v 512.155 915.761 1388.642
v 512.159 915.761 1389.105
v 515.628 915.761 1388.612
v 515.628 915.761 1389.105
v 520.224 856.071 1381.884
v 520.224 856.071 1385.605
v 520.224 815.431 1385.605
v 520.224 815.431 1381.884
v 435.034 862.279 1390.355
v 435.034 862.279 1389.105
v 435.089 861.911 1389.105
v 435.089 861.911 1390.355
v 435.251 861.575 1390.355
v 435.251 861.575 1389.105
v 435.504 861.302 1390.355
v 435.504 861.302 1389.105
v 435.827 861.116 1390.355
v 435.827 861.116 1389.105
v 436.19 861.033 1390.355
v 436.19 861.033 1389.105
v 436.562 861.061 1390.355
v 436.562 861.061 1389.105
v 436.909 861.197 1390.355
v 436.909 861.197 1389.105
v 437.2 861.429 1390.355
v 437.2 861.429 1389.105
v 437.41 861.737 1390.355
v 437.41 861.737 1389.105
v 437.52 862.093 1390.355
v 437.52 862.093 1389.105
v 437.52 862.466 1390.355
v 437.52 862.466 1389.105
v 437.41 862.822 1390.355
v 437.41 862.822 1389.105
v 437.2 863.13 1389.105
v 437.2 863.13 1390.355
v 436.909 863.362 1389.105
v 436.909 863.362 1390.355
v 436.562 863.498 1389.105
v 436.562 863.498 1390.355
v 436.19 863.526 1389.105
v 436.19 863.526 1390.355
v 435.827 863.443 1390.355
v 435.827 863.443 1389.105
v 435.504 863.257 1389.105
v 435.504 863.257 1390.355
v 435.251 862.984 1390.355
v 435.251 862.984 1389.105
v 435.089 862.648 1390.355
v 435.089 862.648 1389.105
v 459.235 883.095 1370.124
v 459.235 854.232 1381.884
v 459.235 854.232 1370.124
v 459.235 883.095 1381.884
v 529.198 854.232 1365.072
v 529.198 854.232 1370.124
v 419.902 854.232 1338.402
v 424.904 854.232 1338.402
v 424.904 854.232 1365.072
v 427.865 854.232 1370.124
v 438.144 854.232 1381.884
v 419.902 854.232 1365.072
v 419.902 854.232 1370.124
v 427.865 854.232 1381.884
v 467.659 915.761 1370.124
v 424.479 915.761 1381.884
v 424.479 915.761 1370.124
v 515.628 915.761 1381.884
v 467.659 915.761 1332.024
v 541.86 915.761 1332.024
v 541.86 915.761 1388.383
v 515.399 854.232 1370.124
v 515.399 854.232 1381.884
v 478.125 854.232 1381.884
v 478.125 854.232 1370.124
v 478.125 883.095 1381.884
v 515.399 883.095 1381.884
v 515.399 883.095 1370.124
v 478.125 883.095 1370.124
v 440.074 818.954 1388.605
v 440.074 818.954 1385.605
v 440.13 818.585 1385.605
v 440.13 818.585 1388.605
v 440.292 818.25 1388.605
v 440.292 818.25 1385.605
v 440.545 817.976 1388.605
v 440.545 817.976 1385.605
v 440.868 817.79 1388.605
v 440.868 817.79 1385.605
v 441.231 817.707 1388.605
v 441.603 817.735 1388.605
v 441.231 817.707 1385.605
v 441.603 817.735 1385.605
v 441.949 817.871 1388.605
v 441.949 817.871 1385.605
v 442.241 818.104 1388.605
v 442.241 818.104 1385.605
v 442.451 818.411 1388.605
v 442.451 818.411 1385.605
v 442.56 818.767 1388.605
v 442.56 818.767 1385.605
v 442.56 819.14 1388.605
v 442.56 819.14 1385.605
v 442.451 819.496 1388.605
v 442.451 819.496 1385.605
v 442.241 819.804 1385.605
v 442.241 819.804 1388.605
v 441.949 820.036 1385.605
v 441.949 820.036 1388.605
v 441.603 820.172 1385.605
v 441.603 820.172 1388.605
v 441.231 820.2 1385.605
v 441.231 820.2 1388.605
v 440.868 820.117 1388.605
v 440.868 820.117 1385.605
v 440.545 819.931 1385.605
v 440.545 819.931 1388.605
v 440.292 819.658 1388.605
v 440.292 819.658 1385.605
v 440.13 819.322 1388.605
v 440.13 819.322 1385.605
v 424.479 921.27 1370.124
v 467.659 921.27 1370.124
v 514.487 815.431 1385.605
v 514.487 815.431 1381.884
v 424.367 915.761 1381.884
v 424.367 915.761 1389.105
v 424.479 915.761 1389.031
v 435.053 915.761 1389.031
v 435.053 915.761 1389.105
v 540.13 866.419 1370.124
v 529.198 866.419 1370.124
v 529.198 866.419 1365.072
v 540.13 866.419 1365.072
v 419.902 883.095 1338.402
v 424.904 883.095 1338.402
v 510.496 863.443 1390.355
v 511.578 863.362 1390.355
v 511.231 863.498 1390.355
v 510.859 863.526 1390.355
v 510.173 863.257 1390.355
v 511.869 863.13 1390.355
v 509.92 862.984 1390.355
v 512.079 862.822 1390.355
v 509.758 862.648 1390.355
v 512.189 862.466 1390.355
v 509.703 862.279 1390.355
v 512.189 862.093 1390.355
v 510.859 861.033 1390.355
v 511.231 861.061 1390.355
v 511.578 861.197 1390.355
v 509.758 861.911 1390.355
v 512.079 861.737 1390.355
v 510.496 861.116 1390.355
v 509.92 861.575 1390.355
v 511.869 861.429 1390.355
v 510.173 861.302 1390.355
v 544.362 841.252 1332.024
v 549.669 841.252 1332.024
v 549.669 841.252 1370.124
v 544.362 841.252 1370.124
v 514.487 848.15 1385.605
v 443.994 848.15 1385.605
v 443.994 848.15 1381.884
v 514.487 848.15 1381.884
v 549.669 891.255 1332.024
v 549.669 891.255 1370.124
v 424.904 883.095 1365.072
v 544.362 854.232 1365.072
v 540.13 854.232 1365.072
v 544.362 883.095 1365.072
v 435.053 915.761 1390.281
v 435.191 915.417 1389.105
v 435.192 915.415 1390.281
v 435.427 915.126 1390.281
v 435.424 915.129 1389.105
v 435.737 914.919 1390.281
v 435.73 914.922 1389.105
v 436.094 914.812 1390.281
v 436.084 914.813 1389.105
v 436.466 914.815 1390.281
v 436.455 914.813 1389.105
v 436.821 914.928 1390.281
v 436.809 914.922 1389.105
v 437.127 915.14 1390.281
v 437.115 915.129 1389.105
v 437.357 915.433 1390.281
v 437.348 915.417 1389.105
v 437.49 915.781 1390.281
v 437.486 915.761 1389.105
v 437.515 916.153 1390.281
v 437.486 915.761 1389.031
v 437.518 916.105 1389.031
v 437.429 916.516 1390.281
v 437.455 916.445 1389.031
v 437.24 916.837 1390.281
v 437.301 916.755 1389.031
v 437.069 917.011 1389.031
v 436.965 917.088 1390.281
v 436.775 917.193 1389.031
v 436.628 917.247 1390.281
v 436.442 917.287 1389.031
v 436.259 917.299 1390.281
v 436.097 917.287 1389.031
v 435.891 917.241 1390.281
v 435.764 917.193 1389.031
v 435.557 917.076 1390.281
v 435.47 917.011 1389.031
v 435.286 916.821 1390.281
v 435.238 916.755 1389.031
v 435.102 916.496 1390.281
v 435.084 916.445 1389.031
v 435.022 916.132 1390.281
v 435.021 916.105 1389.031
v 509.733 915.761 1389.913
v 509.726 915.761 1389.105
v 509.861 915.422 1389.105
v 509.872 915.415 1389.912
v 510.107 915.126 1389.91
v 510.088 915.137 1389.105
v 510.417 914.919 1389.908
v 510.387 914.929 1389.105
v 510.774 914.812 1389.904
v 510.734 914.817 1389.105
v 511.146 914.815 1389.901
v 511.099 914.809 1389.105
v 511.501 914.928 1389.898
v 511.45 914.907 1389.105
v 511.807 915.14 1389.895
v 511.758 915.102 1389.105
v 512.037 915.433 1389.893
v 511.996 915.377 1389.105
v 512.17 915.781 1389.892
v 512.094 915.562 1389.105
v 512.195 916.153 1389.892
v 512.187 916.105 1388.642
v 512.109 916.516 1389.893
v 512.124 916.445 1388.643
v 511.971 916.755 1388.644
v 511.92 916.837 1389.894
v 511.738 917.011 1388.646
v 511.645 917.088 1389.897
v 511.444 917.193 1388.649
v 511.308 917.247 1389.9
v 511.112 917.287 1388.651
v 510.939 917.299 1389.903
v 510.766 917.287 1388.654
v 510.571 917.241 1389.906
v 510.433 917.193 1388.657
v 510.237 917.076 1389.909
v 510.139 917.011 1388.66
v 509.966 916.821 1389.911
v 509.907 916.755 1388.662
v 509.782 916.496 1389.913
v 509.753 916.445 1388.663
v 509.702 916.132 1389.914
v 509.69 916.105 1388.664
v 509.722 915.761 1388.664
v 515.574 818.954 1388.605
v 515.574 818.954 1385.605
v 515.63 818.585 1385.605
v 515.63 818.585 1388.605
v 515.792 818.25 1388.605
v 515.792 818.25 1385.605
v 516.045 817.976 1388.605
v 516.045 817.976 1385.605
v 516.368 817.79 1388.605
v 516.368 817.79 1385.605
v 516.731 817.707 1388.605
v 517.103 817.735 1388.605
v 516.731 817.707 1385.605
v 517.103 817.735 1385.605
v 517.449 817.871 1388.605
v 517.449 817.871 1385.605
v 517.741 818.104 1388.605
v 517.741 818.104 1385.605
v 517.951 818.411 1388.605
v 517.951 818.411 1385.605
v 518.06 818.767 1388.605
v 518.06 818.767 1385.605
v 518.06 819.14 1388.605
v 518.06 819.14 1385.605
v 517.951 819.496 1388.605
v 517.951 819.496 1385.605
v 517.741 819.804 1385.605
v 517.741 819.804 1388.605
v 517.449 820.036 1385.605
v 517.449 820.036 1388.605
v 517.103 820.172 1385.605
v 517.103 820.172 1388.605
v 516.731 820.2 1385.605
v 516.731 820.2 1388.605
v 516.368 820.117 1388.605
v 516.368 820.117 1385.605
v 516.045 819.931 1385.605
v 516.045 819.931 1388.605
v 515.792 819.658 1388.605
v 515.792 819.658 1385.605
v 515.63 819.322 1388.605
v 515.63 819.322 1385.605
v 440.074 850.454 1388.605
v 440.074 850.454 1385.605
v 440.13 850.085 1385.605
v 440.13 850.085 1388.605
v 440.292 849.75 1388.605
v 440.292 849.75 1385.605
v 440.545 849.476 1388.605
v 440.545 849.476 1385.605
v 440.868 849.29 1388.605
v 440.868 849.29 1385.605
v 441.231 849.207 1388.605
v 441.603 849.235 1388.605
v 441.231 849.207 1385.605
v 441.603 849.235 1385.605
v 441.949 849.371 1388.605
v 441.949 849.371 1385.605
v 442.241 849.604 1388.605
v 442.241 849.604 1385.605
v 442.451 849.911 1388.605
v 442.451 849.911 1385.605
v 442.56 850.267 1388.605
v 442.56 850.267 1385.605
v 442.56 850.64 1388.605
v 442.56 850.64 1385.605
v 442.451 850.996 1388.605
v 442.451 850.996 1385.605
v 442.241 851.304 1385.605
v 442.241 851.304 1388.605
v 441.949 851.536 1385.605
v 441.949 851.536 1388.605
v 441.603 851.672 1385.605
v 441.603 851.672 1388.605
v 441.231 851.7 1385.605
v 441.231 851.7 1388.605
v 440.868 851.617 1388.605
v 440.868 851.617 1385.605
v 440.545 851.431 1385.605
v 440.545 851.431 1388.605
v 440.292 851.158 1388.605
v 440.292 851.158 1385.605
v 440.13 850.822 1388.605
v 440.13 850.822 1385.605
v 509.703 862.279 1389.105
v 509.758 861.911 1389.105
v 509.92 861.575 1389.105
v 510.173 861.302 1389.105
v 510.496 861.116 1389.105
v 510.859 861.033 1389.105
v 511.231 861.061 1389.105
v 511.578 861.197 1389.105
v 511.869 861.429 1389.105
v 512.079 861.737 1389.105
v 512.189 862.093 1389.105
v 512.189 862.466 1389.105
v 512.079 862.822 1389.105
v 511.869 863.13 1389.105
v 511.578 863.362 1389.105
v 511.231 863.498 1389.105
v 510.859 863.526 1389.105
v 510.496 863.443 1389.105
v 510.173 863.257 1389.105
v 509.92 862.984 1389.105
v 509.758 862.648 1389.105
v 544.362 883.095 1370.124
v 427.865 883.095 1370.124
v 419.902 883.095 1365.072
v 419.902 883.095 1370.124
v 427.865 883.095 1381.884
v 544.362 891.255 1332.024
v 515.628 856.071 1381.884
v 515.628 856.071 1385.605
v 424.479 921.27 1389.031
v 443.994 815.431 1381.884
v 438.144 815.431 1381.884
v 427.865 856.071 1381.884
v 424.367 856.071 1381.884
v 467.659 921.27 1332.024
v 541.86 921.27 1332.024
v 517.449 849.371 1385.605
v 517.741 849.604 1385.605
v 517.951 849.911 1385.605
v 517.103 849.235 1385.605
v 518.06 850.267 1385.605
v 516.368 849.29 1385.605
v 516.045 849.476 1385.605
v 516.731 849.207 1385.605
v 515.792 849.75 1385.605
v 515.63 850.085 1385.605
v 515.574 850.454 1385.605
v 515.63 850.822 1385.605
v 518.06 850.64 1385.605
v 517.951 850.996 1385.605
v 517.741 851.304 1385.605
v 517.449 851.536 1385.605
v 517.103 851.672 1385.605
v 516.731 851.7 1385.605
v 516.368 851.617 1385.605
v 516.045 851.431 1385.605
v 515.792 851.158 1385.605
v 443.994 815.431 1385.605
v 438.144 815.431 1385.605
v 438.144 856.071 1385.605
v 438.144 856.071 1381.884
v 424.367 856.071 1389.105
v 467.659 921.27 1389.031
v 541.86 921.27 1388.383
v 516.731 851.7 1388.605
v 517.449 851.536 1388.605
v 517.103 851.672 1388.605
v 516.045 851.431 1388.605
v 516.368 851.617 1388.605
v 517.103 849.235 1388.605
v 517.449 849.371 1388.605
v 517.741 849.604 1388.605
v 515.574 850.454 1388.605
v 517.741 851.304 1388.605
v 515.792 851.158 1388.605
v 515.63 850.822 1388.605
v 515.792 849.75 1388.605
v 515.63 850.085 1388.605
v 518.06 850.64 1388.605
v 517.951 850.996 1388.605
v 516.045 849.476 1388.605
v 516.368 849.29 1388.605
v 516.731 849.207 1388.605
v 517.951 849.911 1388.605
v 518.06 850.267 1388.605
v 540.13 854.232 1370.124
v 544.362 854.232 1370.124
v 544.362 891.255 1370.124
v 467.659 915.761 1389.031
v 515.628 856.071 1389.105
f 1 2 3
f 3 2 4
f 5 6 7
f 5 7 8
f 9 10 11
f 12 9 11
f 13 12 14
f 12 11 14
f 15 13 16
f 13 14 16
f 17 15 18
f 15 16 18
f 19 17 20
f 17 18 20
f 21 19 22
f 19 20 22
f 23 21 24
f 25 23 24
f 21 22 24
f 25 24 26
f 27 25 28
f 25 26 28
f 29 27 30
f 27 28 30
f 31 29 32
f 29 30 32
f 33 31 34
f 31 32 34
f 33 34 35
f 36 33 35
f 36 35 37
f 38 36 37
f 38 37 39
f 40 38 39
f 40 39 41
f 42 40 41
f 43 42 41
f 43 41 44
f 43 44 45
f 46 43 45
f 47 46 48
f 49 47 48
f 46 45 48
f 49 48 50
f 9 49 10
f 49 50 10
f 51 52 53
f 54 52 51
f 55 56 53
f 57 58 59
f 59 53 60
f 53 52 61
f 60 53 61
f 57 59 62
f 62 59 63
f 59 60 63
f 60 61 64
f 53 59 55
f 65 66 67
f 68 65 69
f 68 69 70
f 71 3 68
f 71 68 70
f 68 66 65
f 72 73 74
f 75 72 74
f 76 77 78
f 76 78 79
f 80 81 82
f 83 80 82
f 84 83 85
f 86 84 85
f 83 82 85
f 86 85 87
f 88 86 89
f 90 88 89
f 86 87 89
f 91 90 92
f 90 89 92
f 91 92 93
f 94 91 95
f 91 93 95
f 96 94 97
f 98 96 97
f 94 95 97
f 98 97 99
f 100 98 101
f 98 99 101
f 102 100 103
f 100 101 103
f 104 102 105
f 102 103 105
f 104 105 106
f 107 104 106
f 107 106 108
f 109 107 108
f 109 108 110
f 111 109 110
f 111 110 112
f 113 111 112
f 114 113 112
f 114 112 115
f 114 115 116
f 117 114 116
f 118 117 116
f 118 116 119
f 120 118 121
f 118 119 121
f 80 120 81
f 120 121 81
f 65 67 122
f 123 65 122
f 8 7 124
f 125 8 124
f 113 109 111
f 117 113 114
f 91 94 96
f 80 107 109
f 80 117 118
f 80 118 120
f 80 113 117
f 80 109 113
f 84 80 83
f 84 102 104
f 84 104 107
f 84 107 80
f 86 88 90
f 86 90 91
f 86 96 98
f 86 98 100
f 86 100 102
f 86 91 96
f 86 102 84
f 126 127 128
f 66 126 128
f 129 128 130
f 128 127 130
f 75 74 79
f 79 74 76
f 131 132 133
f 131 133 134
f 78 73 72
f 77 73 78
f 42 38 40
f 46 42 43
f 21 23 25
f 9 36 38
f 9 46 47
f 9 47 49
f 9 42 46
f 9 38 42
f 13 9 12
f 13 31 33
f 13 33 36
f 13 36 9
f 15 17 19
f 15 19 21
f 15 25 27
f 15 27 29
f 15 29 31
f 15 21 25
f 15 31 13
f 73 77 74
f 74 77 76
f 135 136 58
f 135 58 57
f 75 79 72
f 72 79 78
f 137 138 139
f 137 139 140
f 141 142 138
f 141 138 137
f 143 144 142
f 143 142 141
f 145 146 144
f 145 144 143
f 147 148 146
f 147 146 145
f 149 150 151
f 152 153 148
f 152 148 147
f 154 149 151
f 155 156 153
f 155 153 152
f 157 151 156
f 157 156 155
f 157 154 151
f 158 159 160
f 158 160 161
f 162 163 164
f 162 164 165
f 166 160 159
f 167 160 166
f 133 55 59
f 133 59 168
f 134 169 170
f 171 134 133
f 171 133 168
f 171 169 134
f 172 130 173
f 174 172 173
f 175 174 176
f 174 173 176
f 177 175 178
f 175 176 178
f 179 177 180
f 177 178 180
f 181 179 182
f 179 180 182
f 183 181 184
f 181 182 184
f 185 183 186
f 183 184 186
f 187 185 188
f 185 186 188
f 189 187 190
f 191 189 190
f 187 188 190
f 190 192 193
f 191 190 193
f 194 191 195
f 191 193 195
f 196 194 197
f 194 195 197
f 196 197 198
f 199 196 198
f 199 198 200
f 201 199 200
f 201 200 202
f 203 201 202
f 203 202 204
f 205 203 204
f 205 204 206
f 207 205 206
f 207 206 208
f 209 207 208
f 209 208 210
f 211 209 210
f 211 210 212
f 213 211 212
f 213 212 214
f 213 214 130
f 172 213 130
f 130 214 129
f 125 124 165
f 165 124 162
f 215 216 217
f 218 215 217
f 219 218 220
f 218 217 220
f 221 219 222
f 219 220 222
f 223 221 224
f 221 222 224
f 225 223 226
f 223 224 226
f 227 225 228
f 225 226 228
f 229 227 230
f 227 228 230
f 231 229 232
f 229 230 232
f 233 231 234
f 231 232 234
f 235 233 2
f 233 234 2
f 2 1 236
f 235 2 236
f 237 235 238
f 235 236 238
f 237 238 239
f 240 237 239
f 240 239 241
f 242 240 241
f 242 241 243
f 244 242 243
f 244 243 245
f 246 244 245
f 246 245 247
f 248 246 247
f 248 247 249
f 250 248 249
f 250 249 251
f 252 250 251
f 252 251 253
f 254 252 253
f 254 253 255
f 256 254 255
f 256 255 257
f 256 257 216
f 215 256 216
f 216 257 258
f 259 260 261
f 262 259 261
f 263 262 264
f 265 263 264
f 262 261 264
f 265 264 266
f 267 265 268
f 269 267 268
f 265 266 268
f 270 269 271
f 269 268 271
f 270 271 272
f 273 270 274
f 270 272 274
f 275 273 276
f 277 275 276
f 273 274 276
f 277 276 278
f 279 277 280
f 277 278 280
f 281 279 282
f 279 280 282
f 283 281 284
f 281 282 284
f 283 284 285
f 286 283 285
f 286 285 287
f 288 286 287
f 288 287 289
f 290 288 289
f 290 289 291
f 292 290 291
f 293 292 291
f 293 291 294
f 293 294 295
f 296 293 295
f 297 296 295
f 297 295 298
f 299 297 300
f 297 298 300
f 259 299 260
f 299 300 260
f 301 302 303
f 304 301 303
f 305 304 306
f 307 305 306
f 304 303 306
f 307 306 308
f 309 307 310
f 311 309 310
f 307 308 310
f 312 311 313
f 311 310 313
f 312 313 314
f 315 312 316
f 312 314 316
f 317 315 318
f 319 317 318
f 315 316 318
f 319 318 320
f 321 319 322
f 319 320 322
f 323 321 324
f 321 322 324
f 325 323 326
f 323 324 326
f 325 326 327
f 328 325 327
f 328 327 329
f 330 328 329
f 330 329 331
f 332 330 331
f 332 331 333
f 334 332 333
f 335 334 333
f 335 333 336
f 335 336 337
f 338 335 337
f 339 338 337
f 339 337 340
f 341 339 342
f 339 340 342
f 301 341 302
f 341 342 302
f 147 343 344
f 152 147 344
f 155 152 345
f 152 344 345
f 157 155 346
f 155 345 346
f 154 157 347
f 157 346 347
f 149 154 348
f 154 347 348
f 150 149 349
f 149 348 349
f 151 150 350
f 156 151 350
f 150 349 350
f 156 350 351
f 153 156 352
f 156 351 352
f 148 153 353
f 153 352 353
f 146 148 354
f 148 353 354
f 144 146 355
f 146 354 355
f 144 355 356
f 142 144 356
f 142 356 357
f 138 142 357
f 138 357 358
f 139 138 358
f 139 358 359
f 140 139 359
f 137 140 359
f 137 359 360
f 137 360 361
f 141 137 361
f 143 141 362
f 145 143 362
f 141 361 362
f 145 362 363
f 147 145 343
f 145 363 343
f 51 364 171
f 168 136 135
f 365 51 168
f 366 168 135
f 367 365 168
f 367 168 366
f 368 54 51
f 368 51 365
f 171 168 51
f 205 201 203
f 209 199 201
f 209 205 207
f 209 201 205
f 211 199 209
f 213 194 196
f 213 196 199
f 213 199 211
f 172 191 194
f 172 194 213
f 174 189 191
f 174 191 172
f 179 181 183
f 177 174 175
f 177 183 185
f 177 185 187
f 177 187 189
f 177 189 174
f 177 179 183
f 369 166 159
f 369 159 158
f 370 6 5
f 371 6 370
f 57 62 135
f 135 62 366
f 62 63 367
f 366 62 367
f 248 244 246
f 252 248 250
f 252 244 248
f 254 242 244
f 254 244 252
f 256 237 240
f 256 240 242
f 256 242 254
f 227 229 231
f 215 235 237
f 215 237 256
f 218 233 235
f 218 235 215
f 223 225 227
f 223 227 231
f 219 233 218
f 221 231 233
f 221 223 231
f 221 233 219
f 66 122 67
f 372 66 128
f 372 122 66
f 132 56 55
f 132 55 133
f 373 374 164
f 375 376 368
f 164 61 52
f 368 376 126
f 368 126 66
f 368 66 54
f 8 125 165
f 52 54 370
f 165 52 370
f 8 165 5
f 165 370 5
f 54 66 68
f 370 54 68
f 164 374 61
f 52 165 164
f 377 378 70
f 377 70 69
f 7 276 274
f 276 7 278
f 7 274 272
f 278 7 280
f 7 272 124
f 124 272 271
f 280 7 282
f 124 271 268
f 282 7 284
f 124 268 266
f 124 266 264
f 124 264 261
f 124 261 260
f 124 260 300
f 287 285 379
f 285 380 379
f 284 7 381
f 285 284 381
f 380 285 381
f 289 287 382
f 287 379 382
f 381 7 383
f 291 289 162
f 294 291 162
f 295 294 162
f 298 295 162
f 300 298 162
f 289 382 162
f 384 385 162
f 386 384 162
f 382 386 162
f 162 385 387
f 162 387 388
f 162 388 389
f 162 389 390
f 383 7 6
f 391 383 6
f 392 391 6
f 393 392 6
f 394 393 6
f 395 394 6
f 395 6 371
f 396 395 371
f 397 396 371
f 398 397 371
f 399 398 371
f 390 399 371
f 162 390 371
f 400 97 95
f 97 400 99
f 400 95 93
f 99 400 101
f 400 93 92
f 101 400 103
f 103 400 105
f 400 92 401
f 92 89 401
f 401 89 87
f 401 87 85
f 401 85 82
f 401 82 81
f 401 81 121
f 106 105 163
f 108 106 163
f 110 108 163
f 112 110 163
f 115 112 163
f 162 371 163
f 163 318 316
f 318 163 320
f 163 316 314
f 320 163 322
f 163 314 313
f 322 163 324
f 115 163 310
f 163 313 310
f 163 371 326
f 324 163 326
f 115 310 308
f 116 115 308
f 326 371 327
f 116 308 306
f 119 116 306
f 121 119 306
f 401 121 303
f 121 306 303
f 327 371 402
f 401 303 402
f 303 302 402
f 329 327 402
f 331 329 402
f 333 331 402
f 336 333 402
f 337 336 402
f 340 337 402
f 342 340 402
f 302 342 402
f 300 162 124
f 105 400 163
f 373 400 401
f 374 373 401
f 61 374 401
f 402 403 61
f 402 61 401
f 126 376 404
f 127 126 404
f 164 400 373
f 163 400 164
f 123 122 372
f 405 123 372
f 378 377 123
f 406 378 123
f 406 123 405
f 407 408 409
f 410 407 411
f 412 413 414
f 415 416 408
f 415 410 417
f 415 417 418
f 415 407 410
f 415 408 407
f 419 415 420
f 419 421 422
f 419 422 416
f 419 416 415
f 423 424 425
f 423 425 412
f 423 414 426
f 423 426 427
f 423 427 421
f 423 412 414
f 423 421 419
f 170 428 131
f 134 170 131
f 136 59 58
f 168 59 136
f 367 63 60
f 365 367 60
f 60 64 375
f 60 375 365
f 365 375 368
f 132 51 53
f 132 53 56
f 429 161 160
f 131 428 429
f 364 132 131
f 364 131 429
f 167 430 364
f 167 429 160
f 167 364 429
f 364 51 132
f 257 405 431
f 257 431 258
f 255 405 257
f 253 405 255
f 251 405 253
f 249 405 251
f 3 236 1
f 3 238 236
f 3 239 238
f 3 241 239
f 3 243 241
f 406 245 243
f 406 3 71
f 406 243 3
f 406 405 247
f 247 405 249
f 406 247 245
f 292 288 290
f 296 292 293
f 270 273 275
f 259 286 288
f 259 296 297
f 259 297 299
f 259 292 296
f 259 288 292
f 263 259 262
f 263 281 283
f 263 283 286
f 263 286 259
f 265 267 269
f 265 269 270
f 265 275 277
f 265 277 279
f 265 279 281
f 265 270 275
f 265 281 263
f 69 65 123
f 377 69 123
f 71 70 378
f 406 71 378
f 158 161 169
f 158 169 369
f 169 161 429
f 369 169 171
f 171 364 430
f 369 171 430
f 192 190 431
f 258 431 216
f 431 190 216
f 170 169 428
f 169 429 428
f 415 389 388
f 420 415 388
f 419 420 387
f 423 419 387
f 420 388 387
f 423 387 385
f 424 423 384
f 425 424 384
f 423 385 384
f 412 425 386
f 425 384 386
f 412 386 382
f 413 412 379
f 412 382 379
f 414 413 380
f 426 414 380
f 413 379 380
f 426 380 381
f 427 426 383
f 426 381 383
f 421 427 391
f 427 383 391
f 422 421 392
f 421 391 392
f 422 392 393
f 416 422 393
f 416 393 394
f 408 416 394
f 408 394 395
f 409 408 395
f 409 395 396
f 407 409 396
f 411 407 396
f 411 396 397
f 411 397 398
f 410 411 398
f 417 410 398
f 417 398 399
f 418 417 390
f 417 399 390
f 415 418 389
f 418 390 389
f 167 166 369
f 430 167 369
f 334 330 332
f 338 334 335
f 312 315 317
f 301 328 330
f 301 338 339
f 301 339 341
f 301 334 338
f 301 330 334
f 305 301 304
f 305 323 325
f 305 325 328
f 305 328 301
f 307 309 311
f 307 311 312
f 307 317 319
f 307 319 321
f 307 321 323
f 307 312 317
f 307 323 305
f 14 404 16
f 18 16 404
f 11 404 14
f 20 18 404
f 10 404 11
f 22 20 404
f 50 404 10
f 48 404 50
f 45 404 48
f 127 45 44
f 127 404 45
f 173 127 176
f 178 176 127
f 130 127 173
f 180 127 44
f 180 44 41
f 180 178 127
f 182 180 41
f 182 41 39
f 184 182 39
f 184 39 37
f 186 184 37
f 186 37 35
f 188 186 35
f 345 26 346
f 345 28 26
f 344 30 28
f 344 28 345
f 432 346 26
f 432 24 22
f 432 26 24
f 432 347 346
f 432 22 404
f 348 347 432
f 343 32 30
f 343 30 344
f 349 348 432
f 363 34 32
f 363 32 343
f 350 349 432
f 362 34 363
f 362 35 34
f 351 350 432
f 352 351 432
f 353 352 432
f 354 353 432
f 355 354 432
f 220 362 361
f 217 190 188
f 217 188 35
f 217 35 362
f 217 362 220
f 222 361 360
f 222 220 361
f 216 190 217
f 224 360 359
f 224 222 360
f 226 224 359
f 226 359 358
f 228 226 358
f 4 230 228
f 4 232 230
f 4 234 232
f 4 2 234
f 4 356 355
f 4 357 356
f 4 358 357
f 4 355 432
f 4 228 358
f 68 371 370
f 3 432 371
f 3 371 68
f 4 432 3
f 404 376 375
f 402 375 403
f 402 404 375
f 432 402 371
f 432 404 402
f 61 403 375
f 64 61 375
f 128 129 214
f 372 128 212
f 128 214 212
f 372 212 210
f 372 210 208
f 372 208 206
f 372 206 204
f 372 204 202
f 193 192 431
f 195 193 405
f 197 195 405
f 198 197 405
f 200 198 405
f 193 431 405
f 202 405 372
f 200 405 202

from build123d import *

# Parameters (mm, degrees)
SKETCH2_W             = 74.20112143
SKETCH2_H             = 5.509329328
BOSS_EXTRUDE1_DEPTH   = 31.75
SKETCH2_W_2           = 5.306940646
SKETCH2_H_2           = 50.003346063
BOSS_EXTRUDE1_2_DEPTH = 31.75
SKETCH3_W             = 74.20112143
SKETCH3_H             = 5.509329328
SKETCH3_W_2           = 5.306940646
SKETCH3_H_2           = 50.003346063
BOSS_EXTRUDE2_DEPTH   = 6.35
SKETCH4_W             = 5.051549335
SKETCH4_H             = 28.862745674
BOSS_EXTRUDE3_DEPTH   = 124.46
SKETCH5_W             = 5.001212889
SKETCH5_H             = 28.862745674
BOSS_EXTRUDE4_DEPTH   = 26.67
BOSS_EXTRUDE7_REACH   = 1075.465
SKETCH9_W             = 74.20112143
SKETCH9_H             = 5.509329328
SKETCH11_W            = 119.769071802
SKETCH11_H            = 7.221051578
BOSS_EXTRUDE8_DEPTH   = 59.69
SKETCH12_W            = 18.906782183
SKETCH12_H            = 5.509329328
BOSS_EXTRUDE9_DEPTH   = 43.18
SKETCH13_R            = 1.25
BOSS_EXTRUDE10_DEPTH  = 1.25
SKETCH14_R            = 1.25
BOSS_EXTRUDE11_DEPTH  = 1.25
SKETCH15_R            = 1.25
BOSS_EXTRUDE12_DEPTH  = 1.25
SKETCH17_W            = 28.508394359
SKETCH17_H            = 59.69
CUT_EXTRUDE1_DEPTH    = 7.62
SKETCH18_W            = 10.932918465
SKETCH18_H            = 12.187050208
CUT_EXTRUDE2_DEPTH    = 7.62
BOSS_EXTRUDE13_DEPTH  = 40.64
SKETCH21_W            = 70.492813389
SKETCH21_H            = 32.719224038
CUT_EXTRUDE3_DEPTH    = 12.7
SKETCH22_R            = 1.25
BOSS_EXTRUDE14_DEPTH  = 3
BOSS_EXTRUDE15_REACH  = 1075.947
SKETCH24_W            = 37.273805704
SKETCH24_H            = 28.862745674
BOSS_EXTRUDE16_REACH  = 1075.947
SKETCH25_W            = 31.370714304
SKETCH25_H            = 28.862745674


with BuildPart() as part:
    # Sketch2 → Boss-Extrude1 (new body)
    with BuildSketch(Plane.XY.offset(1338.373843603)):
        with Locations((504.759181332, 918.515687133)):
            Rectangle(SKETCH2_W, SKETCH2_H)
    extrude(amount=BOSS_EXTRUDE1_DEPTH)



with BuildPart() as body_2:
    # Sketch2 → Boss-Extrude1 2 (new body)
    with BuildSketch(Plane.XY.offset(1338.373843603)):
        with Locations((547.015879906, 866.253246095)):
            Rectangle(SKETCH2_W_2, SKETCH2_H_2)
    extrude(amount=BOSS_EXTRUDE1_2_DEPTH)


with BuildPart() as part_1:
    add(part.part)

    add(body_2.part)  # Boss-Extrude2 merges body 2
    # Sketch3 → Boss-Extrude2 (add)
    with BuildSketch(Plane(origin=(0, 0, 1338.373843603), x_dir=(-1, 0, 0), z_dir=(0, 0, -1))):
        with Locations((-504.759181332, 918.515687133)):
            Rectangle(SKETCH3_W, SKETCH3_H)
        with Locations((-547.015879906, 866.253246095)):
            Rectangle(SKETCH3_W_2, SKETCH3_H_2)
    extrude(amount=BOSS_EXTRUDE2_DEPTH)

    # Sketch4 → Boss-Extrude3 (add)
    with BuildSketch(Plane.ZY.offset(-544.362409583)):
        with Locations((1367.598068936, 868.663439861)):
            Rectangle(SKETCH4_W, SKETCH4_H)
    extrude(amount=BOSS_EXTRUDE3_DEPTH)

    # Sketch5 → Boss-Extrude4 (add)
    with BuildSketch(Plane(origin=(0, 0, 1365.072294268), x_dir=(-1, 0, 0), z_dir=(0, 0, -1))):
        with Locations((-422.403016028, 868.663439861)):
            Rectangle(SKETCH5_W, SKETCH5_H)
    extrude(amount=BOSS_EXTRUDE4_DEPTH)



with BuildPart() as body_2_2:
    # Boss-Extrude7: up to this plane
    boss_extrude7_end = Plane(origin=(483.853693238, 889.164381922, 1388.889293529), z_dir=(0.008726535498373836, 0, 0.9999619230641713))
    # Sketch9 → Boss-Extrude7 (new, up to the surface)
    with BuildSketch(Plane.XY.offset(1370.123843603), mode=Mode.PRIVATE) as boss_extrude7_sk1:
        with Locations((504.759181332, 918.515687133)):
            Rectangle(SKETCH9_W, SKETCH9_H)
    boss_extrude7_tool1 = split(extrude(boss_extrude7_sk1.sketch, amount=BOSS_EXTRUDE7_REACH, mode=Mode.PRIVATE), bisect_by=boss_extrude7_end, keep=Keep.BOTH, mode=Mode.PRIVATE)
    add(boss_extrude7_tool1.solids().sort_by_distance((504.759181, 918.515687, 1370.123844))[0])

    # Sketch11 → Boss-Extrude8 (add)
    with BuildSketch(Plane.XZ.offset(-915.761022469)):
        with Locations((484.251561922, 1385.494960895)):
            Rectangle(SKETCH11_W, SKETCH11_H)
    extrude(amount=BOSS_EXTRUDE8_DEPTH)


with BuildPart() as part_2:
    add(part_1.part)

    add(body_2_2.part)  # Boss-Extrude9 merges body 2 2
    # Sketch12 → Boss-Extrude9 (add)
    with BuildSketch(Plane.ZY.offset(-467.658620617)):
        with Locations((1379.577234695, 918.515687133)):
            Rectangle(SKETCH12_W, SKETCH12_H)
    extrude(amount=BOSS_EXTRUDE9_DEPTH)

    # Sketch13 → Boss-Extrude10 (add)
    with BuildSketch(Plane.XY.offset(1389.105486684)):
        with Locations(Location((436.283580196, 862.279381922, 0), (0, 0, 180))):
            Circle(SKETCH13_R)
        with Locations(Location((510.952736915, 862.279381922, 0), (0, 0, 180))):
            Circle(SKETCH13_R)
    extrude(amount=BOSS_EXTRUDE10_DEPTH)

    # Sketch14 → Boss-Extrude11 (add)
    with BuildSketch(Plane.XY.offset(1389.030625786)):
        with Locations(Location((436.269505167, 916.049381922, 0), (0, 0, 193.337554782))):
            Circle(SKETCH14_R)
    extrude(amount=BOSS_EXTRUDE11_DEPTH)

    # Sketch15 → Boss-Extrude12 (add)
    with BuildSketch(Plane(origin=(12.156576854, 0, 1393.005731901), x_dir=(0.9999619230641713, 0, -0.008726535498373836), z_dir=(0.008726535498373836, 0, 0.9999619230641713))):
        with Locations(Location((498.801077848, 916.049381922, 0), (0, 0, 193.337554782))):
            Circle(SKETCH15_R)
    extrude(amount=BOSS_EXTRUDE12_DEPTH)

    # Sketch17 → Cut-Extrude1 (cut)
    with BuildSketch(Plane.XY.offset(1389.105486684)):
        with Locations((529.881900643, 885.916022469)):
            Rectangle(SKETCH17_W, SKETCH17_H)
    extrude(amount=-CUT_EXTRUDE1_DEPTH, mode=Mode.SUBTRACT)

    # Sketch18 → Cut-Extrude2 (cut)
    with BuildSketch(Plane.XY.offset(1370.123843603)):
        with Locations((534.664039293, 860.325592128)):
            Rectangle(SKETCH18_W, SKETCH18_H)
    extrude(amount=-CUT_EXTRUDE2_DEPTH, mode=Mode.SUBTRACT)

    # Sketch20 → Boss-Extrude13 (add)
    with BuildSketch(Plane.XZ.offset(-856.071022469)):
        Polygon((515.627703464, 1385.604979593), (520.22442703, 1385.604979593), (520.22442703, 1381.884435106), (515.627703464, 1381.884435106), (438.143953154, 1381.884435106), (438.143953154, 1385.604979593), align=None)
    extrude(amount=BOSS_EXTRUDE13_DEPTH)

    # Sketch21 → Cut-Extrude3 (cut)
    with BuildSketch(Plane.XY.offset(1385.604979593)):
        with Locations((479.240417437, 831.790634488)):
            Rectangle(SKETCH21_W, SKETCH21_H)
    extrude(amount=-CUT_EXTRUDE3_DEPTH, mode=Mode.SUBTRACT)

    # Sketch22 → Boss-Extrude14 (add)
    with BuildSketch(Plane.XY.offset(1385.604979593)):
        with Locations(Location((516.824440929, 850.453733138, 0), (0, 0, 180))):
            Circle(SKETCH22_R)
        with Locations(Location((516.824440929, 818.953733138, 0), (0, 0, 180))):
            Circle(SKETCH22_R)
        with Locations(Location((441.324440929, 850.453733138, 0), (0, 0, 180))):
            Circle(SKETCH22_R)
        with Locations(Location((441.324440929, 818.953733138, 0), (0, 0, 180))):
            Circle(SKETCH22_R)
    extrude(amount=BOSS_EXTRUDE14_DEPTH)


with BuildPart() as body_2_3:

    # Sketch24 → Boss-Extrude15 (new, up to next)
    with BuildSketch(Plane(origin=(0, 0, 1381.884435106), x_dir=(-1, 0, 0), z_dir=(0, 0, -1)), mode=Mode.PRIVATE) as boss_extrude15_sk1:
        with Locations((-496.762080789, 868.663439861)):
            Rectangle(SKETCH24_W, SKETCH24_H)
    boss_extrude15_tool1 = extrude(boss_extrude15_sk1.sketch, amount=BOSS_EXTRUDE15_REACH, mode=Mode.PRIVATE) - part_2.part
    add(boss_extrude15_tool1.solids().sort_by_distance((496.762081, 868.66344, 1381.884435))[0])


with BuildPart() as part_3:
    add(part_2.part)

    # Sketch25 → Boss-Extrude16 (add, up to next)
    with BuildSketch(Plane(origin=(0, 0, 1381.884435106), x_dir=(-1, 0, 0), z_dir=(0, 0, -1)), mode=Mode.PRIVATE) as boss_extrude16_sk1:
        with Locations((-443.549928301, 868.663439861)):
            Rectangle(SKETCH25_W, SKETCH25_H)
    boss_extrude16_tool1 = extrude(boss_extrude16_sk1.sketch, amount=BOSS_EXTRUDE16_REACH, mode=Mode.PRIVATE) - part_3.part
    add(boss_extrude16_tool1.solids().sort_by_distance((443.549928, 868.66344, 1381.884435))[0])


solid = Compound([body_2_3.part, part_3.part])
